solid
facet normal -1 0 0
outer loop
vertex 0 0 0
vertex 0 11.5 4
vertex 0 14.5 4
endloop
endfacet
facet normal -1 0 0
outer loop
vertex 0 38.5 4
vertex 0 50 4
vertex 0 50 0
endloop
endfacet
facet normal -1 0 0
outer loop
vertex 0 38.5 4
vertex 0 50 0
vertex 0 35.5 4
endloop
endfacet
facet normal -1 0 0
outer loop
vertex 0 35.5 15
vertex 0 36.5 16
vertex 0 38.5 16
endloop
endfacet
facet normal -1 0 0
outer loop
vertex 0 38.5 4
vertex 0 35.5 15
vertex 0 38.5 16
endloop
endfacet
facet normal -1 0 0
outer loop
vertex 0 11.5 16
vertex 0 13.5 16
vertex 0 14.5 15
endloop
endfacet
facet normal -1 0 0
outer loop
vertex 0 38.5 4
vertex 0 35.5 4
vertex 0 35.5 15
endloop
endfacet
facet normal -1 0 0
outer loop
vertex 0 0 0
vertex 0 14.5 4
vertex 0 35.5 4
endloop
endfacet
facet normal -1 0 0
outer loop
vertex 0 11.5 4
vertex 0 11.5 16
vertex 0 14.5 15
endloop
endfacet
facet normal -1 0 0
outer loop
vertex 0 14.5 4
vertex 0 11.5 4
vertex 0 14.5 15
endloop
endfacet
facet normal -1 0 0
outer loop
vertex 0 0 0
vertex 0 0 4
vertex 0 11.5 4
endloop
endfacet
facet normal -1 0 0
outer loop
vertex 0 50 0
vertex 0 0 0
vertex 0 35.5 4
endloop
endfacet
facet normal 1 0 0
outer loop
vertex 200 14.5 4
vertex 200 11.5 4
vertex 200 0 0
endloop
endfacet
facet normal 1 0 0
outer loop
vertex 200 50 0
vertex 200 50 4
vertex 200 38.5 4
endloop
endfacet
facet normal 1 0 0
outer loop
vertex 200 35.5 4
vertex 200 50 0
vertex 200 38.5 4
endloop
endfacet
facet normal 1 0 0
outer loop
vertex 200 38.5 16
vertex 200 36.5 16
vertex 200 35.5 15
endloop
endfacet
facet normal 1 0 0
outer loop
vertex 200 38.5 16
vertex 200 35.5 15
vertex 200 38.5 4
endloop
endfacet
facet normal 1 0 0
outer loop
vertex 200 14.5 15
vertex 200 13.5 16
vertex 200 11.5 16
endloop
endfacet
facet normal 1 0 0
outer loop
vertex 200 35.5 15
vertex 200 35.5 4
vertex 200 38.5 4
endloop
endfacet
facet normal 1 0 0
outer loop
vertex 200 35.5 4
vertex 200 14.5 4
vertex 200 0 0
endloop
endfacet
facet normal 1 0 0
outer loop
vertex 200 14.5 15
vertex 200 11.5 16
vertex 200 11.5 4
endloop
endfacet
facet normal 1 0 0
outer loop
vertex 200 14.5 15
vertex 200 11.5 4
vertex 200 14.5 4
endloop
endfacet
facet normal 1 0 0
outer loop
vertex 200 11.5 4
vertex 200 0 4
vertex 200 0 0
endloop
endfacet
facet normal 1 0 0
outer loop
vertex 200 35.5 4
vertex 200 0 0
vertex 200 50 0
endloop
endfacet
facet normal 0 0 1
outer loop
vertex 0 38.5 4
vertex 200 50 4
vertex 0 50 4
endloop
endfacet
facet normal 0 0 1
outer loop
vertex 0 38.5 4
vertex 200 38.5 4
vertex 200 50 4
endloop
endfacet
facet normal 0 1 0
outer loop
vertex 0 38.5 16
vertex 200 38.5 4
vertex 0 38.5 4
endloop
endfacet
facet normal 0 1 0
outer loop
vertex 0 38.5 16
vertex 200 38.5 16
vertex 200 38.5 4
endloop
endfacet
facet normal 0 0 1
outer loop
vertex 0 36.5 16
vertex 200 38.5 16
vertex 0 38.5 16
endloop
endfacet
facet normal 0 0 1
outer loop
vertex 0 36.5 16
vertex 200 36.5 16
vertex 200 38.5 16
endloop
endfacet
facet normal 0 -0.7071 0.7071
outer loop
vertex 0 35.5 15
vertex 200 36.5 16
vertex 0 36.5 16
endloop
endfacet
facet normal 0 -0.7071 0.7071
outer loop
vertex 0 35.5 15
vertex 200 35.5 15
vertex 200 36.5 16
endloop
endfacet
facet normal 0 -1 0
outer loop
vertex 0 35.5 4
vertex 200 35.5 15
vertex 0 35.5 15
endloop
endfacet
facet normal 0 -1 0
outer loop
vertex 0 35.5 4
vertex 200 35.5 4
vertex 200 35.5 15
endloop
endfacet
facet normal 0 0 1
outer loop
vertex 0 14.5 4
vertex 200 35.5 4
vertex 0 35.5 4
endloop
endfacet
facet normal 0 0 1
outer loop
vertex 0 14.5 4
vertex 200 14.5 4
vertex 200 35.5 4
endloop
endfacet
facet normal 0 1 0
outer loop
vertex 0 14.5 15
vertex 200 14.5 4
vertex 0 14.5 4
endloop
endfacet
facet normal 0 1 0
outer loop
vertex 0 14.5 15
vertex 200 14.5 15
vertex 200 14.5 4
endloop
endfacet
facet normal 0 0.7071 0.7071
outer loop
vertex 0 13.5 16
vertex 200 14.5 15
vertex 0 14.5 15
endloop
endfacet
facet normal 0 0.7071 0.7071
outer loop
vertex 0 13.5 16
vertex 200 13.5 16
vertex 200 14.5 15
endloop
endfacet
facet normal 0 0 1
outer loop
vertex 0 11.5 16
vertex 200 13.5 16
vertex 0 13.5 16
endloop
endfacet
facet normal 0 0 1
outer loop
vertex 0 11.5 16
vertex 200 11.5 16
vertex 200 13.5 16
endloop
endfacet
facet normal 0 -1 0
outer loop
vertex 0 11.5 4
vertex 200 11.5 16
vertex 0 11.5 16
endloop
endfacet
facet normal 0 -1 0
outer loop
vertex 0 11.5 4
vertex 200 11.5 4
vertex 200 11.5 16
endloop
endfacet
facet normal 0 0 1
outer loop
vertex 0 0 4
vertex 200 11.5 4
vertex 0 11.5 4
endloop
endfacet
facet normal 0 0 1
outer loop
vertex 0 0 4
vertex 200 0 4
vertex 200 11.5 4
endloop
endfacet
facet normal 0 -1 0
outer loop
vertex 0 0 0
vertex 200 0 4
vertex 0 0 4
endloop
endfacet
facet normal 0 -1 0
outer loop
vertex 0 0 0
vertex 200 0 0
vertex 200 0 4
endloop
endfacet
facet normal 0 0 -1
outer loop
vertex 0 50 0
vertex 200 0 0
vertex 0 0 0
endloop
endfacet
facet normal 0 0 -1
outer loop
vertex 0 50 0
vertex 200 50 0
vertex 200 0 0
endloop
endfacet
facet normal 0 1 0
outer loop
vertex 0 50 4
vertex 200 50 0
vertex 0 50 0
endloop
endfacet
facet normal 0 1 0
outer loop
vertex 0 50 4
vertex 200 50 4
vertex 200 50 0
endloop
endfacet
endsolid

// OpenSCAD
// Landscape phone and hub stand. Dimensions in millimeters.
base_length = 200;
base_width = 50;
base_thickness = 4;
channel_width = 21;
wall_thickness = 3;
wall_height = 12;
entry_chamfer = 1;

outer_width = channel_width + 2 * wall_thickness;
margin = (base_width - outer_width) / 2;
left_inner = margin + wall_thickness;
right_inner = left_inner + channel_width;
wall_top = base_thickness + wall_height;

assert(base_length > 0 && base_thickness > 0);
assert(margin >= 0 && channel_width > 0);
assert(entry_chamfer > 0 && entry_chamfer < wall_thickness);
assert(entry_chamfer < wall_height);

// The cross-section lies in YZ; extrusion runs along X.
// Both channel ends remain open. No internal divider or foot recesses.
section = [
    [0, 0],
    [base_width, 0],
    [base_width, base_thickness],
    [right_inner + wall_thickness, base_thickness],
    [right_inner + wall_thickness, wall_top],
    [right_inner + entry_chamfer, wall_top],
    [right_inner, wall_top - entry_chamfer],
    [right_inner, base_thickness],
    [left_inner, base_thickness],
    [left_inner, wall_top - entry_chamfer],
    [left_inner - entry_chamfer, wall_top],
    [margin, wall_top],
    [margin, base_thickness],
    [0, base_thickness]
];

rotate([90, 0, 90])
    linear_extrude(height = base_length, convexity = 10)
        polygon(points = section);
